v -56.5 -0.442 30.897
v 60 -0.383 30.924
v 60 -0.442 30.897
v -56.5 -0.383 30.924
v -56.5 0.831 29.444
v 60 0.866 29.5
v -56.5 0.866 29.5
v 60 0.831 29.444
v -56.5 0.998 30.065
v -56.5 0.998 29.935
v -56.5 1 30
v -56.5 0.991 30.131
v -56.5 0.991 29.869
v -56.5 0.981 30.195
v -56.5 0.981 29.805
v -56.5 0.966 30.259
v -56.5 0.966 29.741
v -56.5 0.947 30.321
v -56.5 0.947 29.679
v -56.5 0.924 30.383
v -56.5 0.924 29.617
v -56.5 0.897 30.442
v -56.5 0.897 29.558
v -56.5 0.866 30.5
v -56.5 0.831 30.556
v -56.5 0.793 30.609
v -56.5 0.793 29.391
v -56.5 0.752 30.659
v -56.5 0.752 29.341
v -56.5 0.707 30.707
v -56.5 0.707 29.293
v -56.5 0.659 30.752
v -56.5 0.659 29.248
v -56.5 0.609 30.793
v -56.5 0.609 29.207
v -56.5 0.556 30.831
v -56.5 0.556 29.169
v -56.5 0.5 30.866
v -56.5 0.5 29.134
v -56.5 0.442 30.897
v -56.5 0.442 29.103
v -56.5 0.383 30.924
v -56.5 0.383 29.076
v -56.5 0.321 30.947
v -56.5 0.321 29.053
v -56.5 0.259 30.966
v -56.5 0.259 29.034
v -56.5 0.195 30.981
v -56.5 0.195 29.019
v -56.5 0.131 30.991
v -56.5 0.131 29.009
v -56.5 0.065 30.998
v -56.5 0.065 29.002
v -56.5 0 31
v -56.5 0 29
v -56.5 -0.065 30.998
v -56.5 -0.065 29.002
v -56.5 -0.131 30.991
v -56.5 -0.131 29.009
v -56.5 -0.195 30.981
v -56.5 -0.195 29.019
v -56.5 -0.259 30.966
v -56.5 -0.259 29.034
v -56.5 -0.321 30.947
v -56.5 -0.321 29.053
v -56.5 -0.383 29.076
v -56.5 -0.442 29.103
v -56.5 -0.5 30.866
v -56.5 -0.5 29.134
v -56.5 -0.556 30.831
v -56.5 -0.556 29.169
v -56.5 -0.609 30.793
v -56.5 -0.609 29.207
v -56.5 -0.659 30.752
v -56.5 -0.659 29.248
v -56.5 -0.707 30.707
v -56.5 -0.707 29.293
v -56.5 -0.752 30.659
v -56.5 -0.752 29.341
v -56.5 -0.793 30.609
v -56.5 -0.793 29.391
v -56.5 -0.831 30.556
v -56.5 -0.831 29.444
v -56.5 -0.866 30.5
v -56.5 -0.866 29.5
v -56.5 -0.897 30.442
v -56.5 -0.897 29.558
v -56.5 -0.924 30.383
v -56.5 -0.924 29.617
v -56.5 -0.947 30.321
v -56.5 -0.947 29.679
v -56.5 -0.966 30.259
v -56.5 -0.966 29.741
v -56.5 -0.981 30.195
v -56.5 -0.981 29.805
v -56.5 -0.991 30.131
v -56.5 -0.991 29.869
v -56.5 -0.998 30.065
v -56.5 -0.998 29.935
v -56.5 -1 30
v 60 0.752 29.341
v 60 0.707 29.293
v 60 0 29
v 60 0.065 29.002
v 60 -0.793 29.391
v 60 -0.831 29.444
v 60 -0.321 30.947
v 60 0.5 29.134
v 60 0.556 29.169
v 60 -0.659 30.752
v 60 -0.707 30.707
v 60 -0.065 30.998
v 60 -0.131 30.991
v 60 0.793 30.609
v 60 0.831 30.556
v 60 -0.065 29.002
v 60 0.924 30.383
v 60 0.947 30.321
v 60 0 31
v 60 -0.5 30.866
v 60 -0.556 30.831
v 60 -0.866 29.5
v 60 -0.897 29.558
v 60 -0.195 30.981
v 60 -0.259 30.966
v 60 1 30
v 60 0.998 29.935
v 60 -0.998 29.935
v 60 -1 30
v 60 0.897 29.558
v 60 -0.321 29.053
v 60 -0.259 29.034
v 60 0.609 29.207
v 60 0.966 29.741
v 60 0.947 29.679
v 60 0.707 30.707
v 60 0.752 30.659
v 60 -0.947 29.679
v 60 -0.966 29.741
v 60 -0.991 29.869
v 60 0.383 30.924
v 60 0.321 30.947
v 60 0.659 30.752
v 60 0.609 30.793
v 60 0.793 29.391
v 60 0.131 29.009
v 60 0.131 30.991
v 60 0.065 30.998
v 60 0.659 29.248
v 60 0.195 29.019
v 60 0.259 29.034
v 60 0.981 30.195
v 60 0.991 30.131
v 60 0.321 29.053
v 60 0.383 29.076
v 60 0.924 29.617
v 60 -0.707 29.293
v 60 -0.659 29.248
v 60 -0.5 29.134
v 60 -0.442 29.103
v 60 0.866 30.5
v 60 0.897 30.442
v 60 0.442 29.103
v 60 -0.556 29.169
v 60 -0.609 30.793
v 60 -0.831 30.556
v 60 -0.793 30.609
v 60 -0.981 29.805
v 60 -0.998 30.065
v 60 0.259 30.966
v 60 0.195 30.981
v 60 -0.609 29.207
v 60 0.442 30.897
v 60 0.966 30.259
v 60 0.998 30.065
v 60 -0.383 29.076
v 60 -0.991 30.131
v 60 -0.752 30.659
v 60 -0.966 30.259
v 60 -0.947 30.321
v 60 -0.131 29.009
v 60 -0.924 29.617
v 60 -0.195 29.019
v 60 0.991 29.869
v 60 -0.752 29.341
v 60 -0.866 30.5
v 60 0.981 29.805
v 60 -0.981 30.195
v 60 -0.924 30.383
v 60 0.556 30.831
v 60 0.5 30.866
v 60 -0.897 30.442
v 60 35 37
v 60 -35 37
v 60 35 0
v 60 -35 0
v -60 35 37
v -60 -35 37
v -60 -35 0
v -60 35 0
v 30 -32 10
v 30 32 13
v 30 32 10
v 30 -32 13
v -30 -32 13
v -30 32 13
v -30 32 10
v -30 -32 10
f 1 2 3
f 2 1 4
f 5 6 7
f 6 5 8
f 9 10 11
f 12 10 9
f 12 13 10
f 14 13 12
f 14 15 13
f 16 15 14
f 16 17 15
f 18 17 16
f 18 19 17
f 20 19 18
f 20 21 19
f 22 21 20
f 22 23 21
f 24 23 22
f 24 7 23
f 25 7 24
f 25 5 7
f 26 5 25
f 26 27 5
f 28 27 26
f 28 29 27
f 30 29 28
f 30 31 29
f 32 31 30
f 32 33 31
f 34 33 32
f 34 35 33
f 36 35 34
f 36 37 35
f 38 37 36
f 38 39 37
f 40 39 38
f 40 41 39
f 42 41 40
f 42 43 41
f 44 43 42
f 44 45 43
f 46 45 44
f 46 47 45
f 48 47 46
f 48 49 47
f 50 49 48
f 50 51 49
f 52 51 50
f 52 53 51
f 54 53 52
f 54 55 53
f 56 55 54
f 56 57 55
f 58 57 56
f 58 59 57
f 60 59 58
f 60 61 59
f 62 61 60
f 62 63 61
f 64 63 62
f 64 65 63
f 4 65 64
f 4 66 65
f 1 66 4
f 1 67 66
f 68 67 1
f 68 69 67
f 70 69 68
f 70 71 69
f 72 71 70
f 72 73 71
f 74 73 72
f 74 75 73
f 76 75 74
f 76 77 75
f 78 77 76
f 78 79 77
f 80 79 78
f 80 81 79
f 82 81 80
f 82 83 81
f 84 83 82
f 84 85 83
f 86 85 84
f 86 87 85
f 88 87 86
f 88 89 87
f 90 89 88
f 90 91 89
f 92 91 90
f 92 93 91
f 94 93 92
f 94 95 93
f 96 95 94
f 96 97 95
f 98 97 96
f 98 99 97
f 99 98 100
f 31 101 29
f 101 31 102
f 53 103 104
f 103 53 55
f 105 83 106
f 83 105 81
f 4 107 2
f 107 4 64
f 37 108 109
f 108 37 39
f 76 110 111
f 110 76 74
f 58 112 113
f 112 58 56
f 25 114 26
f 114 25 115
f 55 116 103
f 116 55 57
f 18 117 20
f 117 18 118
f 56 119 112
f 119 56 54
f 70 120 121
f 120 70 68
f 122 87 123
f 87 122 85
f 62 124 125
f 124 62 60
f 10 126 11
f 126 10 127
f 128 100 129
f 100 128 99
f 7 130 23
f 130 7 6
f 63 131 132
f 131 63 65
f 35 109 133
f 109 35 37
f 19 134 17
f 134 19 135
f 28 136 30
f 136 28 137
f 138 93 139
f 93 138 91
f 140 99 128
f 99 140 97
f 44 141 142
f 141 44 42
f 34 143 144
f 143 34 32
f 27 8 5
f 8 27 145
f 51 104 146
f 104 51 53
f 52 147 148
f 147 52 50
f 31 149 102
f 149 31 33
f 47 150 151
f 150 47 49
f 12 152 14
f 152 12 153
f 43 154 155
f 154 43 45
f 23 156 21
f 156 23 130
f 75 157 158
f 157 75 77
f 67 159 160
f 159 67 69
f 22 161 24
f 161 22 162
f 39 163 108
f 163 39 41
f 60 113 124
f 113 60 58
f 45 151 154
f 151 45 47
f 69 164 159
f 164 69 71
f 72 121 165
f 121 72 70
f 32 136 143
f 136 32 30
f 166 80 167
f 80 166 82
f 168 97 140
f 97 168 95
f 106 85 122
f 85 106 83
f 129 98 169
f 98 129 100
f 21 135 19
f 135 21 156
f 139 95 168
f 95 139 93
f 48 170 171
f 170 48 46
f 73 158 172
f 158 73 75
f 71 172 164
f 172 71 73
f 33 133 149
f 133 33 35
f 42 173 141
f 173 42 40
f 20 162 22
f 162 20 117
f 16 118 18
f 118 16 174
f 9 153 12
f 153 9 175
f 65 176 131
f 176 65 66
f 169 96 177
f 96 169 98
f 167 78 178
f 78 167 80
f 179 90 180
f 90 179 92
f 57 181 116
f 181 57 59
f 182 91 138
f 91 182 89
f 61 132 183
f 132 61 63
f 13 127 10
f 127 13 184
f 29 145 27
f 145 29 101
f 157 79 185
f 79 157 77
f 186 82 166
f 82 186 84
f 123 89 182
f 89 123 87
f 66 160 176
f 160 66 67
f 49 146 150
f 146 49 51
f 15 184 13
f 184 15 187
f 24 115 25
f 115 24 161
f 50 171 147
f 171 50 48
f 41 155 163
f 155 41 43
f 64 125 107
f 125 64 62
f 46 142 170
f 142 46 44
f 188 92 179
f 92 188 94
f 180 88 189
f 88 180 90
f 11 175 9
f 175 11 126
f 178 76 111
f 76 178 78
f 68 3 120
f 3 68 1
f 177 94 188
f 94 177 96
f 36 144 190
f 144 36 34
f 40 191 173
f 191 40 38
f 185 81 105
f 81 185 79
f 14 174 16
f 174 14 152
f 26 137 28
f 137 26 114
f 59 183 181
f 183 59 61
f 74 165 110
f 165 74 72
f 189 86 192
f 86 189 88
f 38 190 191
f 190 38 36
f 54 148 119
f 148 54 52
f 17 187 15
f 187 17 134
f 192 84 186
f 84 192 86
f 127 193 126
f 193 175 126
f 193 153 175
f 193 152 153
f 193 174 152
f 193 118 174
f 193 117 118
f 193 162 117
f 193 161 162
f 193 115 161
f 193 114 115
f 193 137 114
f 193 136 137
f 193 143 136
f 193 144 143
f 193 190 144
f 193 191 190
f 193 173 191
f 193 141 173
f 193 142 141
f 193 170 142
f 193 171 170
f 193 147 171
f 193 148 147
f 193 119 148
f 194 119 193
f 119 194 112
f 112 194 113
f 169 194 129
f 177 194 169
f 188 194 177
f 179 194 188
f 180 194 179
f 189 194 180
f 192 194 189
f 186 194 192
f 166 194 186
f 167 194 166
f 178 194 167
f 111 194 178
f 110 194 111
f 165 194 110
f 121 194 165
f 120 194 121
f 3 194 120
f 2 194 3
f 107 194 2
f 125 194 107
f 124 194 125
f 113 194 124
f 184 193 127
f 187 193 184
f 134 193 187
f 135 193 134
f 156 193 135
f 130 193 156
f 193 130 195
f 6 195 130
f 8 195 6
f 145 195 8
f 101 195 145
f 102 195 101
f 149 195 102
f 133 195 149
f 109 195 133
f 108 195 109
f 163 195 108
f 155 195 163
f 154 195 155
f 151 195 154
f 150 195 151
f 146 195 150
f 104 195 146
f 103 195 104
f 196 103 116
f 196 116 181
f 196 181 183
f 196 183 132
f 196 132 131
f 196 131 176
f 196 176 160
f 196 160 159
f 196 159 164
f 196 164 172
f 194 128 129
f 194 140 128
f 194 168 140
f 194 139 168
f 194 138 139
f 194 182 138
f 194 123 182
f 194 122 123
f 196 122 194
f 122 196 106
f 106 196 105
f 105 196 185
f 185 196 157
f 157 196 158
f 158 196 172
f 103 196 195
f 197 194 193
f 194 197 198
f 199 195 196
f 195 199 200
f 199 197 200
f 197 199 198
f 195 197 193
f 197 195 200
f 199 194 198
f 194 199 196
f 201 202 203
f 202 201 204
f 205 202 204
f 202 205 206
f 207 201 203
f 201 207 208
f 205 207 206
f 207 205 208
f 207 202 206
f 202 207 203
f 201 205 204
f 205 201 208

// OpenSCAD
// Mini horizontal gel-electrophoresis buffer tank
// Print orientation: open top facing up (+Z), resting on XY plane at z = 0

// ---------------- Parameters ----------------
tank_x      = 120;   // outer length in X (mm)
tank_y      = 70;    // outer width in Y (mm)
tank_z      = 40;    // outer height in Z (mm)
wall        = 3;     // wall thickness (mm)
floor       = 3;     // floor thickness (mm)

platform_x  = 60;    // platform length in X (mm), centred
platform_z  = 10;    // platform top height above inner floor (mm) -> z = 13

hole_d      = 2;     // electrode wire hole diameter (mm)
hole_y      = 0;     // hole centre Y (mm)
hole_z      = 30;    // hole centre Z (mm)

eps         = 0.5;   // cutter overshoot past faces (mm)
$fn         = 96;    // curve resolution

// ---------------- Derived ----------------
inner_x = tank_x - 2 * wall;   // 114
inner_y = tank_y - 2 * wall;   // 64
inner_z = tank_z - floor;      // 37

// ---------------- Model ----------------
difference() {
    // Tank body (open top)
    translate([-tank_x / 2, -tank_y / 2, 0])
        cube([tank_x, tank_y, tank_z - wall]);

    // Raised gel-tray platform, full inner width
    translate([-platform_x / 2, -inner_y / 2, platform_z])
        cube([platform_x, inner_y, wall]);

    // Horizontal electrode holes through each end wall along X
    for (sx = [-1, 1])
        translate([sx * (inner_x / 2 - eps), hole_y, hole_z])
            rotate([0, 90, 0])
                cylinder(d = hole_d, h = tank_x + 2 * eps);
}
